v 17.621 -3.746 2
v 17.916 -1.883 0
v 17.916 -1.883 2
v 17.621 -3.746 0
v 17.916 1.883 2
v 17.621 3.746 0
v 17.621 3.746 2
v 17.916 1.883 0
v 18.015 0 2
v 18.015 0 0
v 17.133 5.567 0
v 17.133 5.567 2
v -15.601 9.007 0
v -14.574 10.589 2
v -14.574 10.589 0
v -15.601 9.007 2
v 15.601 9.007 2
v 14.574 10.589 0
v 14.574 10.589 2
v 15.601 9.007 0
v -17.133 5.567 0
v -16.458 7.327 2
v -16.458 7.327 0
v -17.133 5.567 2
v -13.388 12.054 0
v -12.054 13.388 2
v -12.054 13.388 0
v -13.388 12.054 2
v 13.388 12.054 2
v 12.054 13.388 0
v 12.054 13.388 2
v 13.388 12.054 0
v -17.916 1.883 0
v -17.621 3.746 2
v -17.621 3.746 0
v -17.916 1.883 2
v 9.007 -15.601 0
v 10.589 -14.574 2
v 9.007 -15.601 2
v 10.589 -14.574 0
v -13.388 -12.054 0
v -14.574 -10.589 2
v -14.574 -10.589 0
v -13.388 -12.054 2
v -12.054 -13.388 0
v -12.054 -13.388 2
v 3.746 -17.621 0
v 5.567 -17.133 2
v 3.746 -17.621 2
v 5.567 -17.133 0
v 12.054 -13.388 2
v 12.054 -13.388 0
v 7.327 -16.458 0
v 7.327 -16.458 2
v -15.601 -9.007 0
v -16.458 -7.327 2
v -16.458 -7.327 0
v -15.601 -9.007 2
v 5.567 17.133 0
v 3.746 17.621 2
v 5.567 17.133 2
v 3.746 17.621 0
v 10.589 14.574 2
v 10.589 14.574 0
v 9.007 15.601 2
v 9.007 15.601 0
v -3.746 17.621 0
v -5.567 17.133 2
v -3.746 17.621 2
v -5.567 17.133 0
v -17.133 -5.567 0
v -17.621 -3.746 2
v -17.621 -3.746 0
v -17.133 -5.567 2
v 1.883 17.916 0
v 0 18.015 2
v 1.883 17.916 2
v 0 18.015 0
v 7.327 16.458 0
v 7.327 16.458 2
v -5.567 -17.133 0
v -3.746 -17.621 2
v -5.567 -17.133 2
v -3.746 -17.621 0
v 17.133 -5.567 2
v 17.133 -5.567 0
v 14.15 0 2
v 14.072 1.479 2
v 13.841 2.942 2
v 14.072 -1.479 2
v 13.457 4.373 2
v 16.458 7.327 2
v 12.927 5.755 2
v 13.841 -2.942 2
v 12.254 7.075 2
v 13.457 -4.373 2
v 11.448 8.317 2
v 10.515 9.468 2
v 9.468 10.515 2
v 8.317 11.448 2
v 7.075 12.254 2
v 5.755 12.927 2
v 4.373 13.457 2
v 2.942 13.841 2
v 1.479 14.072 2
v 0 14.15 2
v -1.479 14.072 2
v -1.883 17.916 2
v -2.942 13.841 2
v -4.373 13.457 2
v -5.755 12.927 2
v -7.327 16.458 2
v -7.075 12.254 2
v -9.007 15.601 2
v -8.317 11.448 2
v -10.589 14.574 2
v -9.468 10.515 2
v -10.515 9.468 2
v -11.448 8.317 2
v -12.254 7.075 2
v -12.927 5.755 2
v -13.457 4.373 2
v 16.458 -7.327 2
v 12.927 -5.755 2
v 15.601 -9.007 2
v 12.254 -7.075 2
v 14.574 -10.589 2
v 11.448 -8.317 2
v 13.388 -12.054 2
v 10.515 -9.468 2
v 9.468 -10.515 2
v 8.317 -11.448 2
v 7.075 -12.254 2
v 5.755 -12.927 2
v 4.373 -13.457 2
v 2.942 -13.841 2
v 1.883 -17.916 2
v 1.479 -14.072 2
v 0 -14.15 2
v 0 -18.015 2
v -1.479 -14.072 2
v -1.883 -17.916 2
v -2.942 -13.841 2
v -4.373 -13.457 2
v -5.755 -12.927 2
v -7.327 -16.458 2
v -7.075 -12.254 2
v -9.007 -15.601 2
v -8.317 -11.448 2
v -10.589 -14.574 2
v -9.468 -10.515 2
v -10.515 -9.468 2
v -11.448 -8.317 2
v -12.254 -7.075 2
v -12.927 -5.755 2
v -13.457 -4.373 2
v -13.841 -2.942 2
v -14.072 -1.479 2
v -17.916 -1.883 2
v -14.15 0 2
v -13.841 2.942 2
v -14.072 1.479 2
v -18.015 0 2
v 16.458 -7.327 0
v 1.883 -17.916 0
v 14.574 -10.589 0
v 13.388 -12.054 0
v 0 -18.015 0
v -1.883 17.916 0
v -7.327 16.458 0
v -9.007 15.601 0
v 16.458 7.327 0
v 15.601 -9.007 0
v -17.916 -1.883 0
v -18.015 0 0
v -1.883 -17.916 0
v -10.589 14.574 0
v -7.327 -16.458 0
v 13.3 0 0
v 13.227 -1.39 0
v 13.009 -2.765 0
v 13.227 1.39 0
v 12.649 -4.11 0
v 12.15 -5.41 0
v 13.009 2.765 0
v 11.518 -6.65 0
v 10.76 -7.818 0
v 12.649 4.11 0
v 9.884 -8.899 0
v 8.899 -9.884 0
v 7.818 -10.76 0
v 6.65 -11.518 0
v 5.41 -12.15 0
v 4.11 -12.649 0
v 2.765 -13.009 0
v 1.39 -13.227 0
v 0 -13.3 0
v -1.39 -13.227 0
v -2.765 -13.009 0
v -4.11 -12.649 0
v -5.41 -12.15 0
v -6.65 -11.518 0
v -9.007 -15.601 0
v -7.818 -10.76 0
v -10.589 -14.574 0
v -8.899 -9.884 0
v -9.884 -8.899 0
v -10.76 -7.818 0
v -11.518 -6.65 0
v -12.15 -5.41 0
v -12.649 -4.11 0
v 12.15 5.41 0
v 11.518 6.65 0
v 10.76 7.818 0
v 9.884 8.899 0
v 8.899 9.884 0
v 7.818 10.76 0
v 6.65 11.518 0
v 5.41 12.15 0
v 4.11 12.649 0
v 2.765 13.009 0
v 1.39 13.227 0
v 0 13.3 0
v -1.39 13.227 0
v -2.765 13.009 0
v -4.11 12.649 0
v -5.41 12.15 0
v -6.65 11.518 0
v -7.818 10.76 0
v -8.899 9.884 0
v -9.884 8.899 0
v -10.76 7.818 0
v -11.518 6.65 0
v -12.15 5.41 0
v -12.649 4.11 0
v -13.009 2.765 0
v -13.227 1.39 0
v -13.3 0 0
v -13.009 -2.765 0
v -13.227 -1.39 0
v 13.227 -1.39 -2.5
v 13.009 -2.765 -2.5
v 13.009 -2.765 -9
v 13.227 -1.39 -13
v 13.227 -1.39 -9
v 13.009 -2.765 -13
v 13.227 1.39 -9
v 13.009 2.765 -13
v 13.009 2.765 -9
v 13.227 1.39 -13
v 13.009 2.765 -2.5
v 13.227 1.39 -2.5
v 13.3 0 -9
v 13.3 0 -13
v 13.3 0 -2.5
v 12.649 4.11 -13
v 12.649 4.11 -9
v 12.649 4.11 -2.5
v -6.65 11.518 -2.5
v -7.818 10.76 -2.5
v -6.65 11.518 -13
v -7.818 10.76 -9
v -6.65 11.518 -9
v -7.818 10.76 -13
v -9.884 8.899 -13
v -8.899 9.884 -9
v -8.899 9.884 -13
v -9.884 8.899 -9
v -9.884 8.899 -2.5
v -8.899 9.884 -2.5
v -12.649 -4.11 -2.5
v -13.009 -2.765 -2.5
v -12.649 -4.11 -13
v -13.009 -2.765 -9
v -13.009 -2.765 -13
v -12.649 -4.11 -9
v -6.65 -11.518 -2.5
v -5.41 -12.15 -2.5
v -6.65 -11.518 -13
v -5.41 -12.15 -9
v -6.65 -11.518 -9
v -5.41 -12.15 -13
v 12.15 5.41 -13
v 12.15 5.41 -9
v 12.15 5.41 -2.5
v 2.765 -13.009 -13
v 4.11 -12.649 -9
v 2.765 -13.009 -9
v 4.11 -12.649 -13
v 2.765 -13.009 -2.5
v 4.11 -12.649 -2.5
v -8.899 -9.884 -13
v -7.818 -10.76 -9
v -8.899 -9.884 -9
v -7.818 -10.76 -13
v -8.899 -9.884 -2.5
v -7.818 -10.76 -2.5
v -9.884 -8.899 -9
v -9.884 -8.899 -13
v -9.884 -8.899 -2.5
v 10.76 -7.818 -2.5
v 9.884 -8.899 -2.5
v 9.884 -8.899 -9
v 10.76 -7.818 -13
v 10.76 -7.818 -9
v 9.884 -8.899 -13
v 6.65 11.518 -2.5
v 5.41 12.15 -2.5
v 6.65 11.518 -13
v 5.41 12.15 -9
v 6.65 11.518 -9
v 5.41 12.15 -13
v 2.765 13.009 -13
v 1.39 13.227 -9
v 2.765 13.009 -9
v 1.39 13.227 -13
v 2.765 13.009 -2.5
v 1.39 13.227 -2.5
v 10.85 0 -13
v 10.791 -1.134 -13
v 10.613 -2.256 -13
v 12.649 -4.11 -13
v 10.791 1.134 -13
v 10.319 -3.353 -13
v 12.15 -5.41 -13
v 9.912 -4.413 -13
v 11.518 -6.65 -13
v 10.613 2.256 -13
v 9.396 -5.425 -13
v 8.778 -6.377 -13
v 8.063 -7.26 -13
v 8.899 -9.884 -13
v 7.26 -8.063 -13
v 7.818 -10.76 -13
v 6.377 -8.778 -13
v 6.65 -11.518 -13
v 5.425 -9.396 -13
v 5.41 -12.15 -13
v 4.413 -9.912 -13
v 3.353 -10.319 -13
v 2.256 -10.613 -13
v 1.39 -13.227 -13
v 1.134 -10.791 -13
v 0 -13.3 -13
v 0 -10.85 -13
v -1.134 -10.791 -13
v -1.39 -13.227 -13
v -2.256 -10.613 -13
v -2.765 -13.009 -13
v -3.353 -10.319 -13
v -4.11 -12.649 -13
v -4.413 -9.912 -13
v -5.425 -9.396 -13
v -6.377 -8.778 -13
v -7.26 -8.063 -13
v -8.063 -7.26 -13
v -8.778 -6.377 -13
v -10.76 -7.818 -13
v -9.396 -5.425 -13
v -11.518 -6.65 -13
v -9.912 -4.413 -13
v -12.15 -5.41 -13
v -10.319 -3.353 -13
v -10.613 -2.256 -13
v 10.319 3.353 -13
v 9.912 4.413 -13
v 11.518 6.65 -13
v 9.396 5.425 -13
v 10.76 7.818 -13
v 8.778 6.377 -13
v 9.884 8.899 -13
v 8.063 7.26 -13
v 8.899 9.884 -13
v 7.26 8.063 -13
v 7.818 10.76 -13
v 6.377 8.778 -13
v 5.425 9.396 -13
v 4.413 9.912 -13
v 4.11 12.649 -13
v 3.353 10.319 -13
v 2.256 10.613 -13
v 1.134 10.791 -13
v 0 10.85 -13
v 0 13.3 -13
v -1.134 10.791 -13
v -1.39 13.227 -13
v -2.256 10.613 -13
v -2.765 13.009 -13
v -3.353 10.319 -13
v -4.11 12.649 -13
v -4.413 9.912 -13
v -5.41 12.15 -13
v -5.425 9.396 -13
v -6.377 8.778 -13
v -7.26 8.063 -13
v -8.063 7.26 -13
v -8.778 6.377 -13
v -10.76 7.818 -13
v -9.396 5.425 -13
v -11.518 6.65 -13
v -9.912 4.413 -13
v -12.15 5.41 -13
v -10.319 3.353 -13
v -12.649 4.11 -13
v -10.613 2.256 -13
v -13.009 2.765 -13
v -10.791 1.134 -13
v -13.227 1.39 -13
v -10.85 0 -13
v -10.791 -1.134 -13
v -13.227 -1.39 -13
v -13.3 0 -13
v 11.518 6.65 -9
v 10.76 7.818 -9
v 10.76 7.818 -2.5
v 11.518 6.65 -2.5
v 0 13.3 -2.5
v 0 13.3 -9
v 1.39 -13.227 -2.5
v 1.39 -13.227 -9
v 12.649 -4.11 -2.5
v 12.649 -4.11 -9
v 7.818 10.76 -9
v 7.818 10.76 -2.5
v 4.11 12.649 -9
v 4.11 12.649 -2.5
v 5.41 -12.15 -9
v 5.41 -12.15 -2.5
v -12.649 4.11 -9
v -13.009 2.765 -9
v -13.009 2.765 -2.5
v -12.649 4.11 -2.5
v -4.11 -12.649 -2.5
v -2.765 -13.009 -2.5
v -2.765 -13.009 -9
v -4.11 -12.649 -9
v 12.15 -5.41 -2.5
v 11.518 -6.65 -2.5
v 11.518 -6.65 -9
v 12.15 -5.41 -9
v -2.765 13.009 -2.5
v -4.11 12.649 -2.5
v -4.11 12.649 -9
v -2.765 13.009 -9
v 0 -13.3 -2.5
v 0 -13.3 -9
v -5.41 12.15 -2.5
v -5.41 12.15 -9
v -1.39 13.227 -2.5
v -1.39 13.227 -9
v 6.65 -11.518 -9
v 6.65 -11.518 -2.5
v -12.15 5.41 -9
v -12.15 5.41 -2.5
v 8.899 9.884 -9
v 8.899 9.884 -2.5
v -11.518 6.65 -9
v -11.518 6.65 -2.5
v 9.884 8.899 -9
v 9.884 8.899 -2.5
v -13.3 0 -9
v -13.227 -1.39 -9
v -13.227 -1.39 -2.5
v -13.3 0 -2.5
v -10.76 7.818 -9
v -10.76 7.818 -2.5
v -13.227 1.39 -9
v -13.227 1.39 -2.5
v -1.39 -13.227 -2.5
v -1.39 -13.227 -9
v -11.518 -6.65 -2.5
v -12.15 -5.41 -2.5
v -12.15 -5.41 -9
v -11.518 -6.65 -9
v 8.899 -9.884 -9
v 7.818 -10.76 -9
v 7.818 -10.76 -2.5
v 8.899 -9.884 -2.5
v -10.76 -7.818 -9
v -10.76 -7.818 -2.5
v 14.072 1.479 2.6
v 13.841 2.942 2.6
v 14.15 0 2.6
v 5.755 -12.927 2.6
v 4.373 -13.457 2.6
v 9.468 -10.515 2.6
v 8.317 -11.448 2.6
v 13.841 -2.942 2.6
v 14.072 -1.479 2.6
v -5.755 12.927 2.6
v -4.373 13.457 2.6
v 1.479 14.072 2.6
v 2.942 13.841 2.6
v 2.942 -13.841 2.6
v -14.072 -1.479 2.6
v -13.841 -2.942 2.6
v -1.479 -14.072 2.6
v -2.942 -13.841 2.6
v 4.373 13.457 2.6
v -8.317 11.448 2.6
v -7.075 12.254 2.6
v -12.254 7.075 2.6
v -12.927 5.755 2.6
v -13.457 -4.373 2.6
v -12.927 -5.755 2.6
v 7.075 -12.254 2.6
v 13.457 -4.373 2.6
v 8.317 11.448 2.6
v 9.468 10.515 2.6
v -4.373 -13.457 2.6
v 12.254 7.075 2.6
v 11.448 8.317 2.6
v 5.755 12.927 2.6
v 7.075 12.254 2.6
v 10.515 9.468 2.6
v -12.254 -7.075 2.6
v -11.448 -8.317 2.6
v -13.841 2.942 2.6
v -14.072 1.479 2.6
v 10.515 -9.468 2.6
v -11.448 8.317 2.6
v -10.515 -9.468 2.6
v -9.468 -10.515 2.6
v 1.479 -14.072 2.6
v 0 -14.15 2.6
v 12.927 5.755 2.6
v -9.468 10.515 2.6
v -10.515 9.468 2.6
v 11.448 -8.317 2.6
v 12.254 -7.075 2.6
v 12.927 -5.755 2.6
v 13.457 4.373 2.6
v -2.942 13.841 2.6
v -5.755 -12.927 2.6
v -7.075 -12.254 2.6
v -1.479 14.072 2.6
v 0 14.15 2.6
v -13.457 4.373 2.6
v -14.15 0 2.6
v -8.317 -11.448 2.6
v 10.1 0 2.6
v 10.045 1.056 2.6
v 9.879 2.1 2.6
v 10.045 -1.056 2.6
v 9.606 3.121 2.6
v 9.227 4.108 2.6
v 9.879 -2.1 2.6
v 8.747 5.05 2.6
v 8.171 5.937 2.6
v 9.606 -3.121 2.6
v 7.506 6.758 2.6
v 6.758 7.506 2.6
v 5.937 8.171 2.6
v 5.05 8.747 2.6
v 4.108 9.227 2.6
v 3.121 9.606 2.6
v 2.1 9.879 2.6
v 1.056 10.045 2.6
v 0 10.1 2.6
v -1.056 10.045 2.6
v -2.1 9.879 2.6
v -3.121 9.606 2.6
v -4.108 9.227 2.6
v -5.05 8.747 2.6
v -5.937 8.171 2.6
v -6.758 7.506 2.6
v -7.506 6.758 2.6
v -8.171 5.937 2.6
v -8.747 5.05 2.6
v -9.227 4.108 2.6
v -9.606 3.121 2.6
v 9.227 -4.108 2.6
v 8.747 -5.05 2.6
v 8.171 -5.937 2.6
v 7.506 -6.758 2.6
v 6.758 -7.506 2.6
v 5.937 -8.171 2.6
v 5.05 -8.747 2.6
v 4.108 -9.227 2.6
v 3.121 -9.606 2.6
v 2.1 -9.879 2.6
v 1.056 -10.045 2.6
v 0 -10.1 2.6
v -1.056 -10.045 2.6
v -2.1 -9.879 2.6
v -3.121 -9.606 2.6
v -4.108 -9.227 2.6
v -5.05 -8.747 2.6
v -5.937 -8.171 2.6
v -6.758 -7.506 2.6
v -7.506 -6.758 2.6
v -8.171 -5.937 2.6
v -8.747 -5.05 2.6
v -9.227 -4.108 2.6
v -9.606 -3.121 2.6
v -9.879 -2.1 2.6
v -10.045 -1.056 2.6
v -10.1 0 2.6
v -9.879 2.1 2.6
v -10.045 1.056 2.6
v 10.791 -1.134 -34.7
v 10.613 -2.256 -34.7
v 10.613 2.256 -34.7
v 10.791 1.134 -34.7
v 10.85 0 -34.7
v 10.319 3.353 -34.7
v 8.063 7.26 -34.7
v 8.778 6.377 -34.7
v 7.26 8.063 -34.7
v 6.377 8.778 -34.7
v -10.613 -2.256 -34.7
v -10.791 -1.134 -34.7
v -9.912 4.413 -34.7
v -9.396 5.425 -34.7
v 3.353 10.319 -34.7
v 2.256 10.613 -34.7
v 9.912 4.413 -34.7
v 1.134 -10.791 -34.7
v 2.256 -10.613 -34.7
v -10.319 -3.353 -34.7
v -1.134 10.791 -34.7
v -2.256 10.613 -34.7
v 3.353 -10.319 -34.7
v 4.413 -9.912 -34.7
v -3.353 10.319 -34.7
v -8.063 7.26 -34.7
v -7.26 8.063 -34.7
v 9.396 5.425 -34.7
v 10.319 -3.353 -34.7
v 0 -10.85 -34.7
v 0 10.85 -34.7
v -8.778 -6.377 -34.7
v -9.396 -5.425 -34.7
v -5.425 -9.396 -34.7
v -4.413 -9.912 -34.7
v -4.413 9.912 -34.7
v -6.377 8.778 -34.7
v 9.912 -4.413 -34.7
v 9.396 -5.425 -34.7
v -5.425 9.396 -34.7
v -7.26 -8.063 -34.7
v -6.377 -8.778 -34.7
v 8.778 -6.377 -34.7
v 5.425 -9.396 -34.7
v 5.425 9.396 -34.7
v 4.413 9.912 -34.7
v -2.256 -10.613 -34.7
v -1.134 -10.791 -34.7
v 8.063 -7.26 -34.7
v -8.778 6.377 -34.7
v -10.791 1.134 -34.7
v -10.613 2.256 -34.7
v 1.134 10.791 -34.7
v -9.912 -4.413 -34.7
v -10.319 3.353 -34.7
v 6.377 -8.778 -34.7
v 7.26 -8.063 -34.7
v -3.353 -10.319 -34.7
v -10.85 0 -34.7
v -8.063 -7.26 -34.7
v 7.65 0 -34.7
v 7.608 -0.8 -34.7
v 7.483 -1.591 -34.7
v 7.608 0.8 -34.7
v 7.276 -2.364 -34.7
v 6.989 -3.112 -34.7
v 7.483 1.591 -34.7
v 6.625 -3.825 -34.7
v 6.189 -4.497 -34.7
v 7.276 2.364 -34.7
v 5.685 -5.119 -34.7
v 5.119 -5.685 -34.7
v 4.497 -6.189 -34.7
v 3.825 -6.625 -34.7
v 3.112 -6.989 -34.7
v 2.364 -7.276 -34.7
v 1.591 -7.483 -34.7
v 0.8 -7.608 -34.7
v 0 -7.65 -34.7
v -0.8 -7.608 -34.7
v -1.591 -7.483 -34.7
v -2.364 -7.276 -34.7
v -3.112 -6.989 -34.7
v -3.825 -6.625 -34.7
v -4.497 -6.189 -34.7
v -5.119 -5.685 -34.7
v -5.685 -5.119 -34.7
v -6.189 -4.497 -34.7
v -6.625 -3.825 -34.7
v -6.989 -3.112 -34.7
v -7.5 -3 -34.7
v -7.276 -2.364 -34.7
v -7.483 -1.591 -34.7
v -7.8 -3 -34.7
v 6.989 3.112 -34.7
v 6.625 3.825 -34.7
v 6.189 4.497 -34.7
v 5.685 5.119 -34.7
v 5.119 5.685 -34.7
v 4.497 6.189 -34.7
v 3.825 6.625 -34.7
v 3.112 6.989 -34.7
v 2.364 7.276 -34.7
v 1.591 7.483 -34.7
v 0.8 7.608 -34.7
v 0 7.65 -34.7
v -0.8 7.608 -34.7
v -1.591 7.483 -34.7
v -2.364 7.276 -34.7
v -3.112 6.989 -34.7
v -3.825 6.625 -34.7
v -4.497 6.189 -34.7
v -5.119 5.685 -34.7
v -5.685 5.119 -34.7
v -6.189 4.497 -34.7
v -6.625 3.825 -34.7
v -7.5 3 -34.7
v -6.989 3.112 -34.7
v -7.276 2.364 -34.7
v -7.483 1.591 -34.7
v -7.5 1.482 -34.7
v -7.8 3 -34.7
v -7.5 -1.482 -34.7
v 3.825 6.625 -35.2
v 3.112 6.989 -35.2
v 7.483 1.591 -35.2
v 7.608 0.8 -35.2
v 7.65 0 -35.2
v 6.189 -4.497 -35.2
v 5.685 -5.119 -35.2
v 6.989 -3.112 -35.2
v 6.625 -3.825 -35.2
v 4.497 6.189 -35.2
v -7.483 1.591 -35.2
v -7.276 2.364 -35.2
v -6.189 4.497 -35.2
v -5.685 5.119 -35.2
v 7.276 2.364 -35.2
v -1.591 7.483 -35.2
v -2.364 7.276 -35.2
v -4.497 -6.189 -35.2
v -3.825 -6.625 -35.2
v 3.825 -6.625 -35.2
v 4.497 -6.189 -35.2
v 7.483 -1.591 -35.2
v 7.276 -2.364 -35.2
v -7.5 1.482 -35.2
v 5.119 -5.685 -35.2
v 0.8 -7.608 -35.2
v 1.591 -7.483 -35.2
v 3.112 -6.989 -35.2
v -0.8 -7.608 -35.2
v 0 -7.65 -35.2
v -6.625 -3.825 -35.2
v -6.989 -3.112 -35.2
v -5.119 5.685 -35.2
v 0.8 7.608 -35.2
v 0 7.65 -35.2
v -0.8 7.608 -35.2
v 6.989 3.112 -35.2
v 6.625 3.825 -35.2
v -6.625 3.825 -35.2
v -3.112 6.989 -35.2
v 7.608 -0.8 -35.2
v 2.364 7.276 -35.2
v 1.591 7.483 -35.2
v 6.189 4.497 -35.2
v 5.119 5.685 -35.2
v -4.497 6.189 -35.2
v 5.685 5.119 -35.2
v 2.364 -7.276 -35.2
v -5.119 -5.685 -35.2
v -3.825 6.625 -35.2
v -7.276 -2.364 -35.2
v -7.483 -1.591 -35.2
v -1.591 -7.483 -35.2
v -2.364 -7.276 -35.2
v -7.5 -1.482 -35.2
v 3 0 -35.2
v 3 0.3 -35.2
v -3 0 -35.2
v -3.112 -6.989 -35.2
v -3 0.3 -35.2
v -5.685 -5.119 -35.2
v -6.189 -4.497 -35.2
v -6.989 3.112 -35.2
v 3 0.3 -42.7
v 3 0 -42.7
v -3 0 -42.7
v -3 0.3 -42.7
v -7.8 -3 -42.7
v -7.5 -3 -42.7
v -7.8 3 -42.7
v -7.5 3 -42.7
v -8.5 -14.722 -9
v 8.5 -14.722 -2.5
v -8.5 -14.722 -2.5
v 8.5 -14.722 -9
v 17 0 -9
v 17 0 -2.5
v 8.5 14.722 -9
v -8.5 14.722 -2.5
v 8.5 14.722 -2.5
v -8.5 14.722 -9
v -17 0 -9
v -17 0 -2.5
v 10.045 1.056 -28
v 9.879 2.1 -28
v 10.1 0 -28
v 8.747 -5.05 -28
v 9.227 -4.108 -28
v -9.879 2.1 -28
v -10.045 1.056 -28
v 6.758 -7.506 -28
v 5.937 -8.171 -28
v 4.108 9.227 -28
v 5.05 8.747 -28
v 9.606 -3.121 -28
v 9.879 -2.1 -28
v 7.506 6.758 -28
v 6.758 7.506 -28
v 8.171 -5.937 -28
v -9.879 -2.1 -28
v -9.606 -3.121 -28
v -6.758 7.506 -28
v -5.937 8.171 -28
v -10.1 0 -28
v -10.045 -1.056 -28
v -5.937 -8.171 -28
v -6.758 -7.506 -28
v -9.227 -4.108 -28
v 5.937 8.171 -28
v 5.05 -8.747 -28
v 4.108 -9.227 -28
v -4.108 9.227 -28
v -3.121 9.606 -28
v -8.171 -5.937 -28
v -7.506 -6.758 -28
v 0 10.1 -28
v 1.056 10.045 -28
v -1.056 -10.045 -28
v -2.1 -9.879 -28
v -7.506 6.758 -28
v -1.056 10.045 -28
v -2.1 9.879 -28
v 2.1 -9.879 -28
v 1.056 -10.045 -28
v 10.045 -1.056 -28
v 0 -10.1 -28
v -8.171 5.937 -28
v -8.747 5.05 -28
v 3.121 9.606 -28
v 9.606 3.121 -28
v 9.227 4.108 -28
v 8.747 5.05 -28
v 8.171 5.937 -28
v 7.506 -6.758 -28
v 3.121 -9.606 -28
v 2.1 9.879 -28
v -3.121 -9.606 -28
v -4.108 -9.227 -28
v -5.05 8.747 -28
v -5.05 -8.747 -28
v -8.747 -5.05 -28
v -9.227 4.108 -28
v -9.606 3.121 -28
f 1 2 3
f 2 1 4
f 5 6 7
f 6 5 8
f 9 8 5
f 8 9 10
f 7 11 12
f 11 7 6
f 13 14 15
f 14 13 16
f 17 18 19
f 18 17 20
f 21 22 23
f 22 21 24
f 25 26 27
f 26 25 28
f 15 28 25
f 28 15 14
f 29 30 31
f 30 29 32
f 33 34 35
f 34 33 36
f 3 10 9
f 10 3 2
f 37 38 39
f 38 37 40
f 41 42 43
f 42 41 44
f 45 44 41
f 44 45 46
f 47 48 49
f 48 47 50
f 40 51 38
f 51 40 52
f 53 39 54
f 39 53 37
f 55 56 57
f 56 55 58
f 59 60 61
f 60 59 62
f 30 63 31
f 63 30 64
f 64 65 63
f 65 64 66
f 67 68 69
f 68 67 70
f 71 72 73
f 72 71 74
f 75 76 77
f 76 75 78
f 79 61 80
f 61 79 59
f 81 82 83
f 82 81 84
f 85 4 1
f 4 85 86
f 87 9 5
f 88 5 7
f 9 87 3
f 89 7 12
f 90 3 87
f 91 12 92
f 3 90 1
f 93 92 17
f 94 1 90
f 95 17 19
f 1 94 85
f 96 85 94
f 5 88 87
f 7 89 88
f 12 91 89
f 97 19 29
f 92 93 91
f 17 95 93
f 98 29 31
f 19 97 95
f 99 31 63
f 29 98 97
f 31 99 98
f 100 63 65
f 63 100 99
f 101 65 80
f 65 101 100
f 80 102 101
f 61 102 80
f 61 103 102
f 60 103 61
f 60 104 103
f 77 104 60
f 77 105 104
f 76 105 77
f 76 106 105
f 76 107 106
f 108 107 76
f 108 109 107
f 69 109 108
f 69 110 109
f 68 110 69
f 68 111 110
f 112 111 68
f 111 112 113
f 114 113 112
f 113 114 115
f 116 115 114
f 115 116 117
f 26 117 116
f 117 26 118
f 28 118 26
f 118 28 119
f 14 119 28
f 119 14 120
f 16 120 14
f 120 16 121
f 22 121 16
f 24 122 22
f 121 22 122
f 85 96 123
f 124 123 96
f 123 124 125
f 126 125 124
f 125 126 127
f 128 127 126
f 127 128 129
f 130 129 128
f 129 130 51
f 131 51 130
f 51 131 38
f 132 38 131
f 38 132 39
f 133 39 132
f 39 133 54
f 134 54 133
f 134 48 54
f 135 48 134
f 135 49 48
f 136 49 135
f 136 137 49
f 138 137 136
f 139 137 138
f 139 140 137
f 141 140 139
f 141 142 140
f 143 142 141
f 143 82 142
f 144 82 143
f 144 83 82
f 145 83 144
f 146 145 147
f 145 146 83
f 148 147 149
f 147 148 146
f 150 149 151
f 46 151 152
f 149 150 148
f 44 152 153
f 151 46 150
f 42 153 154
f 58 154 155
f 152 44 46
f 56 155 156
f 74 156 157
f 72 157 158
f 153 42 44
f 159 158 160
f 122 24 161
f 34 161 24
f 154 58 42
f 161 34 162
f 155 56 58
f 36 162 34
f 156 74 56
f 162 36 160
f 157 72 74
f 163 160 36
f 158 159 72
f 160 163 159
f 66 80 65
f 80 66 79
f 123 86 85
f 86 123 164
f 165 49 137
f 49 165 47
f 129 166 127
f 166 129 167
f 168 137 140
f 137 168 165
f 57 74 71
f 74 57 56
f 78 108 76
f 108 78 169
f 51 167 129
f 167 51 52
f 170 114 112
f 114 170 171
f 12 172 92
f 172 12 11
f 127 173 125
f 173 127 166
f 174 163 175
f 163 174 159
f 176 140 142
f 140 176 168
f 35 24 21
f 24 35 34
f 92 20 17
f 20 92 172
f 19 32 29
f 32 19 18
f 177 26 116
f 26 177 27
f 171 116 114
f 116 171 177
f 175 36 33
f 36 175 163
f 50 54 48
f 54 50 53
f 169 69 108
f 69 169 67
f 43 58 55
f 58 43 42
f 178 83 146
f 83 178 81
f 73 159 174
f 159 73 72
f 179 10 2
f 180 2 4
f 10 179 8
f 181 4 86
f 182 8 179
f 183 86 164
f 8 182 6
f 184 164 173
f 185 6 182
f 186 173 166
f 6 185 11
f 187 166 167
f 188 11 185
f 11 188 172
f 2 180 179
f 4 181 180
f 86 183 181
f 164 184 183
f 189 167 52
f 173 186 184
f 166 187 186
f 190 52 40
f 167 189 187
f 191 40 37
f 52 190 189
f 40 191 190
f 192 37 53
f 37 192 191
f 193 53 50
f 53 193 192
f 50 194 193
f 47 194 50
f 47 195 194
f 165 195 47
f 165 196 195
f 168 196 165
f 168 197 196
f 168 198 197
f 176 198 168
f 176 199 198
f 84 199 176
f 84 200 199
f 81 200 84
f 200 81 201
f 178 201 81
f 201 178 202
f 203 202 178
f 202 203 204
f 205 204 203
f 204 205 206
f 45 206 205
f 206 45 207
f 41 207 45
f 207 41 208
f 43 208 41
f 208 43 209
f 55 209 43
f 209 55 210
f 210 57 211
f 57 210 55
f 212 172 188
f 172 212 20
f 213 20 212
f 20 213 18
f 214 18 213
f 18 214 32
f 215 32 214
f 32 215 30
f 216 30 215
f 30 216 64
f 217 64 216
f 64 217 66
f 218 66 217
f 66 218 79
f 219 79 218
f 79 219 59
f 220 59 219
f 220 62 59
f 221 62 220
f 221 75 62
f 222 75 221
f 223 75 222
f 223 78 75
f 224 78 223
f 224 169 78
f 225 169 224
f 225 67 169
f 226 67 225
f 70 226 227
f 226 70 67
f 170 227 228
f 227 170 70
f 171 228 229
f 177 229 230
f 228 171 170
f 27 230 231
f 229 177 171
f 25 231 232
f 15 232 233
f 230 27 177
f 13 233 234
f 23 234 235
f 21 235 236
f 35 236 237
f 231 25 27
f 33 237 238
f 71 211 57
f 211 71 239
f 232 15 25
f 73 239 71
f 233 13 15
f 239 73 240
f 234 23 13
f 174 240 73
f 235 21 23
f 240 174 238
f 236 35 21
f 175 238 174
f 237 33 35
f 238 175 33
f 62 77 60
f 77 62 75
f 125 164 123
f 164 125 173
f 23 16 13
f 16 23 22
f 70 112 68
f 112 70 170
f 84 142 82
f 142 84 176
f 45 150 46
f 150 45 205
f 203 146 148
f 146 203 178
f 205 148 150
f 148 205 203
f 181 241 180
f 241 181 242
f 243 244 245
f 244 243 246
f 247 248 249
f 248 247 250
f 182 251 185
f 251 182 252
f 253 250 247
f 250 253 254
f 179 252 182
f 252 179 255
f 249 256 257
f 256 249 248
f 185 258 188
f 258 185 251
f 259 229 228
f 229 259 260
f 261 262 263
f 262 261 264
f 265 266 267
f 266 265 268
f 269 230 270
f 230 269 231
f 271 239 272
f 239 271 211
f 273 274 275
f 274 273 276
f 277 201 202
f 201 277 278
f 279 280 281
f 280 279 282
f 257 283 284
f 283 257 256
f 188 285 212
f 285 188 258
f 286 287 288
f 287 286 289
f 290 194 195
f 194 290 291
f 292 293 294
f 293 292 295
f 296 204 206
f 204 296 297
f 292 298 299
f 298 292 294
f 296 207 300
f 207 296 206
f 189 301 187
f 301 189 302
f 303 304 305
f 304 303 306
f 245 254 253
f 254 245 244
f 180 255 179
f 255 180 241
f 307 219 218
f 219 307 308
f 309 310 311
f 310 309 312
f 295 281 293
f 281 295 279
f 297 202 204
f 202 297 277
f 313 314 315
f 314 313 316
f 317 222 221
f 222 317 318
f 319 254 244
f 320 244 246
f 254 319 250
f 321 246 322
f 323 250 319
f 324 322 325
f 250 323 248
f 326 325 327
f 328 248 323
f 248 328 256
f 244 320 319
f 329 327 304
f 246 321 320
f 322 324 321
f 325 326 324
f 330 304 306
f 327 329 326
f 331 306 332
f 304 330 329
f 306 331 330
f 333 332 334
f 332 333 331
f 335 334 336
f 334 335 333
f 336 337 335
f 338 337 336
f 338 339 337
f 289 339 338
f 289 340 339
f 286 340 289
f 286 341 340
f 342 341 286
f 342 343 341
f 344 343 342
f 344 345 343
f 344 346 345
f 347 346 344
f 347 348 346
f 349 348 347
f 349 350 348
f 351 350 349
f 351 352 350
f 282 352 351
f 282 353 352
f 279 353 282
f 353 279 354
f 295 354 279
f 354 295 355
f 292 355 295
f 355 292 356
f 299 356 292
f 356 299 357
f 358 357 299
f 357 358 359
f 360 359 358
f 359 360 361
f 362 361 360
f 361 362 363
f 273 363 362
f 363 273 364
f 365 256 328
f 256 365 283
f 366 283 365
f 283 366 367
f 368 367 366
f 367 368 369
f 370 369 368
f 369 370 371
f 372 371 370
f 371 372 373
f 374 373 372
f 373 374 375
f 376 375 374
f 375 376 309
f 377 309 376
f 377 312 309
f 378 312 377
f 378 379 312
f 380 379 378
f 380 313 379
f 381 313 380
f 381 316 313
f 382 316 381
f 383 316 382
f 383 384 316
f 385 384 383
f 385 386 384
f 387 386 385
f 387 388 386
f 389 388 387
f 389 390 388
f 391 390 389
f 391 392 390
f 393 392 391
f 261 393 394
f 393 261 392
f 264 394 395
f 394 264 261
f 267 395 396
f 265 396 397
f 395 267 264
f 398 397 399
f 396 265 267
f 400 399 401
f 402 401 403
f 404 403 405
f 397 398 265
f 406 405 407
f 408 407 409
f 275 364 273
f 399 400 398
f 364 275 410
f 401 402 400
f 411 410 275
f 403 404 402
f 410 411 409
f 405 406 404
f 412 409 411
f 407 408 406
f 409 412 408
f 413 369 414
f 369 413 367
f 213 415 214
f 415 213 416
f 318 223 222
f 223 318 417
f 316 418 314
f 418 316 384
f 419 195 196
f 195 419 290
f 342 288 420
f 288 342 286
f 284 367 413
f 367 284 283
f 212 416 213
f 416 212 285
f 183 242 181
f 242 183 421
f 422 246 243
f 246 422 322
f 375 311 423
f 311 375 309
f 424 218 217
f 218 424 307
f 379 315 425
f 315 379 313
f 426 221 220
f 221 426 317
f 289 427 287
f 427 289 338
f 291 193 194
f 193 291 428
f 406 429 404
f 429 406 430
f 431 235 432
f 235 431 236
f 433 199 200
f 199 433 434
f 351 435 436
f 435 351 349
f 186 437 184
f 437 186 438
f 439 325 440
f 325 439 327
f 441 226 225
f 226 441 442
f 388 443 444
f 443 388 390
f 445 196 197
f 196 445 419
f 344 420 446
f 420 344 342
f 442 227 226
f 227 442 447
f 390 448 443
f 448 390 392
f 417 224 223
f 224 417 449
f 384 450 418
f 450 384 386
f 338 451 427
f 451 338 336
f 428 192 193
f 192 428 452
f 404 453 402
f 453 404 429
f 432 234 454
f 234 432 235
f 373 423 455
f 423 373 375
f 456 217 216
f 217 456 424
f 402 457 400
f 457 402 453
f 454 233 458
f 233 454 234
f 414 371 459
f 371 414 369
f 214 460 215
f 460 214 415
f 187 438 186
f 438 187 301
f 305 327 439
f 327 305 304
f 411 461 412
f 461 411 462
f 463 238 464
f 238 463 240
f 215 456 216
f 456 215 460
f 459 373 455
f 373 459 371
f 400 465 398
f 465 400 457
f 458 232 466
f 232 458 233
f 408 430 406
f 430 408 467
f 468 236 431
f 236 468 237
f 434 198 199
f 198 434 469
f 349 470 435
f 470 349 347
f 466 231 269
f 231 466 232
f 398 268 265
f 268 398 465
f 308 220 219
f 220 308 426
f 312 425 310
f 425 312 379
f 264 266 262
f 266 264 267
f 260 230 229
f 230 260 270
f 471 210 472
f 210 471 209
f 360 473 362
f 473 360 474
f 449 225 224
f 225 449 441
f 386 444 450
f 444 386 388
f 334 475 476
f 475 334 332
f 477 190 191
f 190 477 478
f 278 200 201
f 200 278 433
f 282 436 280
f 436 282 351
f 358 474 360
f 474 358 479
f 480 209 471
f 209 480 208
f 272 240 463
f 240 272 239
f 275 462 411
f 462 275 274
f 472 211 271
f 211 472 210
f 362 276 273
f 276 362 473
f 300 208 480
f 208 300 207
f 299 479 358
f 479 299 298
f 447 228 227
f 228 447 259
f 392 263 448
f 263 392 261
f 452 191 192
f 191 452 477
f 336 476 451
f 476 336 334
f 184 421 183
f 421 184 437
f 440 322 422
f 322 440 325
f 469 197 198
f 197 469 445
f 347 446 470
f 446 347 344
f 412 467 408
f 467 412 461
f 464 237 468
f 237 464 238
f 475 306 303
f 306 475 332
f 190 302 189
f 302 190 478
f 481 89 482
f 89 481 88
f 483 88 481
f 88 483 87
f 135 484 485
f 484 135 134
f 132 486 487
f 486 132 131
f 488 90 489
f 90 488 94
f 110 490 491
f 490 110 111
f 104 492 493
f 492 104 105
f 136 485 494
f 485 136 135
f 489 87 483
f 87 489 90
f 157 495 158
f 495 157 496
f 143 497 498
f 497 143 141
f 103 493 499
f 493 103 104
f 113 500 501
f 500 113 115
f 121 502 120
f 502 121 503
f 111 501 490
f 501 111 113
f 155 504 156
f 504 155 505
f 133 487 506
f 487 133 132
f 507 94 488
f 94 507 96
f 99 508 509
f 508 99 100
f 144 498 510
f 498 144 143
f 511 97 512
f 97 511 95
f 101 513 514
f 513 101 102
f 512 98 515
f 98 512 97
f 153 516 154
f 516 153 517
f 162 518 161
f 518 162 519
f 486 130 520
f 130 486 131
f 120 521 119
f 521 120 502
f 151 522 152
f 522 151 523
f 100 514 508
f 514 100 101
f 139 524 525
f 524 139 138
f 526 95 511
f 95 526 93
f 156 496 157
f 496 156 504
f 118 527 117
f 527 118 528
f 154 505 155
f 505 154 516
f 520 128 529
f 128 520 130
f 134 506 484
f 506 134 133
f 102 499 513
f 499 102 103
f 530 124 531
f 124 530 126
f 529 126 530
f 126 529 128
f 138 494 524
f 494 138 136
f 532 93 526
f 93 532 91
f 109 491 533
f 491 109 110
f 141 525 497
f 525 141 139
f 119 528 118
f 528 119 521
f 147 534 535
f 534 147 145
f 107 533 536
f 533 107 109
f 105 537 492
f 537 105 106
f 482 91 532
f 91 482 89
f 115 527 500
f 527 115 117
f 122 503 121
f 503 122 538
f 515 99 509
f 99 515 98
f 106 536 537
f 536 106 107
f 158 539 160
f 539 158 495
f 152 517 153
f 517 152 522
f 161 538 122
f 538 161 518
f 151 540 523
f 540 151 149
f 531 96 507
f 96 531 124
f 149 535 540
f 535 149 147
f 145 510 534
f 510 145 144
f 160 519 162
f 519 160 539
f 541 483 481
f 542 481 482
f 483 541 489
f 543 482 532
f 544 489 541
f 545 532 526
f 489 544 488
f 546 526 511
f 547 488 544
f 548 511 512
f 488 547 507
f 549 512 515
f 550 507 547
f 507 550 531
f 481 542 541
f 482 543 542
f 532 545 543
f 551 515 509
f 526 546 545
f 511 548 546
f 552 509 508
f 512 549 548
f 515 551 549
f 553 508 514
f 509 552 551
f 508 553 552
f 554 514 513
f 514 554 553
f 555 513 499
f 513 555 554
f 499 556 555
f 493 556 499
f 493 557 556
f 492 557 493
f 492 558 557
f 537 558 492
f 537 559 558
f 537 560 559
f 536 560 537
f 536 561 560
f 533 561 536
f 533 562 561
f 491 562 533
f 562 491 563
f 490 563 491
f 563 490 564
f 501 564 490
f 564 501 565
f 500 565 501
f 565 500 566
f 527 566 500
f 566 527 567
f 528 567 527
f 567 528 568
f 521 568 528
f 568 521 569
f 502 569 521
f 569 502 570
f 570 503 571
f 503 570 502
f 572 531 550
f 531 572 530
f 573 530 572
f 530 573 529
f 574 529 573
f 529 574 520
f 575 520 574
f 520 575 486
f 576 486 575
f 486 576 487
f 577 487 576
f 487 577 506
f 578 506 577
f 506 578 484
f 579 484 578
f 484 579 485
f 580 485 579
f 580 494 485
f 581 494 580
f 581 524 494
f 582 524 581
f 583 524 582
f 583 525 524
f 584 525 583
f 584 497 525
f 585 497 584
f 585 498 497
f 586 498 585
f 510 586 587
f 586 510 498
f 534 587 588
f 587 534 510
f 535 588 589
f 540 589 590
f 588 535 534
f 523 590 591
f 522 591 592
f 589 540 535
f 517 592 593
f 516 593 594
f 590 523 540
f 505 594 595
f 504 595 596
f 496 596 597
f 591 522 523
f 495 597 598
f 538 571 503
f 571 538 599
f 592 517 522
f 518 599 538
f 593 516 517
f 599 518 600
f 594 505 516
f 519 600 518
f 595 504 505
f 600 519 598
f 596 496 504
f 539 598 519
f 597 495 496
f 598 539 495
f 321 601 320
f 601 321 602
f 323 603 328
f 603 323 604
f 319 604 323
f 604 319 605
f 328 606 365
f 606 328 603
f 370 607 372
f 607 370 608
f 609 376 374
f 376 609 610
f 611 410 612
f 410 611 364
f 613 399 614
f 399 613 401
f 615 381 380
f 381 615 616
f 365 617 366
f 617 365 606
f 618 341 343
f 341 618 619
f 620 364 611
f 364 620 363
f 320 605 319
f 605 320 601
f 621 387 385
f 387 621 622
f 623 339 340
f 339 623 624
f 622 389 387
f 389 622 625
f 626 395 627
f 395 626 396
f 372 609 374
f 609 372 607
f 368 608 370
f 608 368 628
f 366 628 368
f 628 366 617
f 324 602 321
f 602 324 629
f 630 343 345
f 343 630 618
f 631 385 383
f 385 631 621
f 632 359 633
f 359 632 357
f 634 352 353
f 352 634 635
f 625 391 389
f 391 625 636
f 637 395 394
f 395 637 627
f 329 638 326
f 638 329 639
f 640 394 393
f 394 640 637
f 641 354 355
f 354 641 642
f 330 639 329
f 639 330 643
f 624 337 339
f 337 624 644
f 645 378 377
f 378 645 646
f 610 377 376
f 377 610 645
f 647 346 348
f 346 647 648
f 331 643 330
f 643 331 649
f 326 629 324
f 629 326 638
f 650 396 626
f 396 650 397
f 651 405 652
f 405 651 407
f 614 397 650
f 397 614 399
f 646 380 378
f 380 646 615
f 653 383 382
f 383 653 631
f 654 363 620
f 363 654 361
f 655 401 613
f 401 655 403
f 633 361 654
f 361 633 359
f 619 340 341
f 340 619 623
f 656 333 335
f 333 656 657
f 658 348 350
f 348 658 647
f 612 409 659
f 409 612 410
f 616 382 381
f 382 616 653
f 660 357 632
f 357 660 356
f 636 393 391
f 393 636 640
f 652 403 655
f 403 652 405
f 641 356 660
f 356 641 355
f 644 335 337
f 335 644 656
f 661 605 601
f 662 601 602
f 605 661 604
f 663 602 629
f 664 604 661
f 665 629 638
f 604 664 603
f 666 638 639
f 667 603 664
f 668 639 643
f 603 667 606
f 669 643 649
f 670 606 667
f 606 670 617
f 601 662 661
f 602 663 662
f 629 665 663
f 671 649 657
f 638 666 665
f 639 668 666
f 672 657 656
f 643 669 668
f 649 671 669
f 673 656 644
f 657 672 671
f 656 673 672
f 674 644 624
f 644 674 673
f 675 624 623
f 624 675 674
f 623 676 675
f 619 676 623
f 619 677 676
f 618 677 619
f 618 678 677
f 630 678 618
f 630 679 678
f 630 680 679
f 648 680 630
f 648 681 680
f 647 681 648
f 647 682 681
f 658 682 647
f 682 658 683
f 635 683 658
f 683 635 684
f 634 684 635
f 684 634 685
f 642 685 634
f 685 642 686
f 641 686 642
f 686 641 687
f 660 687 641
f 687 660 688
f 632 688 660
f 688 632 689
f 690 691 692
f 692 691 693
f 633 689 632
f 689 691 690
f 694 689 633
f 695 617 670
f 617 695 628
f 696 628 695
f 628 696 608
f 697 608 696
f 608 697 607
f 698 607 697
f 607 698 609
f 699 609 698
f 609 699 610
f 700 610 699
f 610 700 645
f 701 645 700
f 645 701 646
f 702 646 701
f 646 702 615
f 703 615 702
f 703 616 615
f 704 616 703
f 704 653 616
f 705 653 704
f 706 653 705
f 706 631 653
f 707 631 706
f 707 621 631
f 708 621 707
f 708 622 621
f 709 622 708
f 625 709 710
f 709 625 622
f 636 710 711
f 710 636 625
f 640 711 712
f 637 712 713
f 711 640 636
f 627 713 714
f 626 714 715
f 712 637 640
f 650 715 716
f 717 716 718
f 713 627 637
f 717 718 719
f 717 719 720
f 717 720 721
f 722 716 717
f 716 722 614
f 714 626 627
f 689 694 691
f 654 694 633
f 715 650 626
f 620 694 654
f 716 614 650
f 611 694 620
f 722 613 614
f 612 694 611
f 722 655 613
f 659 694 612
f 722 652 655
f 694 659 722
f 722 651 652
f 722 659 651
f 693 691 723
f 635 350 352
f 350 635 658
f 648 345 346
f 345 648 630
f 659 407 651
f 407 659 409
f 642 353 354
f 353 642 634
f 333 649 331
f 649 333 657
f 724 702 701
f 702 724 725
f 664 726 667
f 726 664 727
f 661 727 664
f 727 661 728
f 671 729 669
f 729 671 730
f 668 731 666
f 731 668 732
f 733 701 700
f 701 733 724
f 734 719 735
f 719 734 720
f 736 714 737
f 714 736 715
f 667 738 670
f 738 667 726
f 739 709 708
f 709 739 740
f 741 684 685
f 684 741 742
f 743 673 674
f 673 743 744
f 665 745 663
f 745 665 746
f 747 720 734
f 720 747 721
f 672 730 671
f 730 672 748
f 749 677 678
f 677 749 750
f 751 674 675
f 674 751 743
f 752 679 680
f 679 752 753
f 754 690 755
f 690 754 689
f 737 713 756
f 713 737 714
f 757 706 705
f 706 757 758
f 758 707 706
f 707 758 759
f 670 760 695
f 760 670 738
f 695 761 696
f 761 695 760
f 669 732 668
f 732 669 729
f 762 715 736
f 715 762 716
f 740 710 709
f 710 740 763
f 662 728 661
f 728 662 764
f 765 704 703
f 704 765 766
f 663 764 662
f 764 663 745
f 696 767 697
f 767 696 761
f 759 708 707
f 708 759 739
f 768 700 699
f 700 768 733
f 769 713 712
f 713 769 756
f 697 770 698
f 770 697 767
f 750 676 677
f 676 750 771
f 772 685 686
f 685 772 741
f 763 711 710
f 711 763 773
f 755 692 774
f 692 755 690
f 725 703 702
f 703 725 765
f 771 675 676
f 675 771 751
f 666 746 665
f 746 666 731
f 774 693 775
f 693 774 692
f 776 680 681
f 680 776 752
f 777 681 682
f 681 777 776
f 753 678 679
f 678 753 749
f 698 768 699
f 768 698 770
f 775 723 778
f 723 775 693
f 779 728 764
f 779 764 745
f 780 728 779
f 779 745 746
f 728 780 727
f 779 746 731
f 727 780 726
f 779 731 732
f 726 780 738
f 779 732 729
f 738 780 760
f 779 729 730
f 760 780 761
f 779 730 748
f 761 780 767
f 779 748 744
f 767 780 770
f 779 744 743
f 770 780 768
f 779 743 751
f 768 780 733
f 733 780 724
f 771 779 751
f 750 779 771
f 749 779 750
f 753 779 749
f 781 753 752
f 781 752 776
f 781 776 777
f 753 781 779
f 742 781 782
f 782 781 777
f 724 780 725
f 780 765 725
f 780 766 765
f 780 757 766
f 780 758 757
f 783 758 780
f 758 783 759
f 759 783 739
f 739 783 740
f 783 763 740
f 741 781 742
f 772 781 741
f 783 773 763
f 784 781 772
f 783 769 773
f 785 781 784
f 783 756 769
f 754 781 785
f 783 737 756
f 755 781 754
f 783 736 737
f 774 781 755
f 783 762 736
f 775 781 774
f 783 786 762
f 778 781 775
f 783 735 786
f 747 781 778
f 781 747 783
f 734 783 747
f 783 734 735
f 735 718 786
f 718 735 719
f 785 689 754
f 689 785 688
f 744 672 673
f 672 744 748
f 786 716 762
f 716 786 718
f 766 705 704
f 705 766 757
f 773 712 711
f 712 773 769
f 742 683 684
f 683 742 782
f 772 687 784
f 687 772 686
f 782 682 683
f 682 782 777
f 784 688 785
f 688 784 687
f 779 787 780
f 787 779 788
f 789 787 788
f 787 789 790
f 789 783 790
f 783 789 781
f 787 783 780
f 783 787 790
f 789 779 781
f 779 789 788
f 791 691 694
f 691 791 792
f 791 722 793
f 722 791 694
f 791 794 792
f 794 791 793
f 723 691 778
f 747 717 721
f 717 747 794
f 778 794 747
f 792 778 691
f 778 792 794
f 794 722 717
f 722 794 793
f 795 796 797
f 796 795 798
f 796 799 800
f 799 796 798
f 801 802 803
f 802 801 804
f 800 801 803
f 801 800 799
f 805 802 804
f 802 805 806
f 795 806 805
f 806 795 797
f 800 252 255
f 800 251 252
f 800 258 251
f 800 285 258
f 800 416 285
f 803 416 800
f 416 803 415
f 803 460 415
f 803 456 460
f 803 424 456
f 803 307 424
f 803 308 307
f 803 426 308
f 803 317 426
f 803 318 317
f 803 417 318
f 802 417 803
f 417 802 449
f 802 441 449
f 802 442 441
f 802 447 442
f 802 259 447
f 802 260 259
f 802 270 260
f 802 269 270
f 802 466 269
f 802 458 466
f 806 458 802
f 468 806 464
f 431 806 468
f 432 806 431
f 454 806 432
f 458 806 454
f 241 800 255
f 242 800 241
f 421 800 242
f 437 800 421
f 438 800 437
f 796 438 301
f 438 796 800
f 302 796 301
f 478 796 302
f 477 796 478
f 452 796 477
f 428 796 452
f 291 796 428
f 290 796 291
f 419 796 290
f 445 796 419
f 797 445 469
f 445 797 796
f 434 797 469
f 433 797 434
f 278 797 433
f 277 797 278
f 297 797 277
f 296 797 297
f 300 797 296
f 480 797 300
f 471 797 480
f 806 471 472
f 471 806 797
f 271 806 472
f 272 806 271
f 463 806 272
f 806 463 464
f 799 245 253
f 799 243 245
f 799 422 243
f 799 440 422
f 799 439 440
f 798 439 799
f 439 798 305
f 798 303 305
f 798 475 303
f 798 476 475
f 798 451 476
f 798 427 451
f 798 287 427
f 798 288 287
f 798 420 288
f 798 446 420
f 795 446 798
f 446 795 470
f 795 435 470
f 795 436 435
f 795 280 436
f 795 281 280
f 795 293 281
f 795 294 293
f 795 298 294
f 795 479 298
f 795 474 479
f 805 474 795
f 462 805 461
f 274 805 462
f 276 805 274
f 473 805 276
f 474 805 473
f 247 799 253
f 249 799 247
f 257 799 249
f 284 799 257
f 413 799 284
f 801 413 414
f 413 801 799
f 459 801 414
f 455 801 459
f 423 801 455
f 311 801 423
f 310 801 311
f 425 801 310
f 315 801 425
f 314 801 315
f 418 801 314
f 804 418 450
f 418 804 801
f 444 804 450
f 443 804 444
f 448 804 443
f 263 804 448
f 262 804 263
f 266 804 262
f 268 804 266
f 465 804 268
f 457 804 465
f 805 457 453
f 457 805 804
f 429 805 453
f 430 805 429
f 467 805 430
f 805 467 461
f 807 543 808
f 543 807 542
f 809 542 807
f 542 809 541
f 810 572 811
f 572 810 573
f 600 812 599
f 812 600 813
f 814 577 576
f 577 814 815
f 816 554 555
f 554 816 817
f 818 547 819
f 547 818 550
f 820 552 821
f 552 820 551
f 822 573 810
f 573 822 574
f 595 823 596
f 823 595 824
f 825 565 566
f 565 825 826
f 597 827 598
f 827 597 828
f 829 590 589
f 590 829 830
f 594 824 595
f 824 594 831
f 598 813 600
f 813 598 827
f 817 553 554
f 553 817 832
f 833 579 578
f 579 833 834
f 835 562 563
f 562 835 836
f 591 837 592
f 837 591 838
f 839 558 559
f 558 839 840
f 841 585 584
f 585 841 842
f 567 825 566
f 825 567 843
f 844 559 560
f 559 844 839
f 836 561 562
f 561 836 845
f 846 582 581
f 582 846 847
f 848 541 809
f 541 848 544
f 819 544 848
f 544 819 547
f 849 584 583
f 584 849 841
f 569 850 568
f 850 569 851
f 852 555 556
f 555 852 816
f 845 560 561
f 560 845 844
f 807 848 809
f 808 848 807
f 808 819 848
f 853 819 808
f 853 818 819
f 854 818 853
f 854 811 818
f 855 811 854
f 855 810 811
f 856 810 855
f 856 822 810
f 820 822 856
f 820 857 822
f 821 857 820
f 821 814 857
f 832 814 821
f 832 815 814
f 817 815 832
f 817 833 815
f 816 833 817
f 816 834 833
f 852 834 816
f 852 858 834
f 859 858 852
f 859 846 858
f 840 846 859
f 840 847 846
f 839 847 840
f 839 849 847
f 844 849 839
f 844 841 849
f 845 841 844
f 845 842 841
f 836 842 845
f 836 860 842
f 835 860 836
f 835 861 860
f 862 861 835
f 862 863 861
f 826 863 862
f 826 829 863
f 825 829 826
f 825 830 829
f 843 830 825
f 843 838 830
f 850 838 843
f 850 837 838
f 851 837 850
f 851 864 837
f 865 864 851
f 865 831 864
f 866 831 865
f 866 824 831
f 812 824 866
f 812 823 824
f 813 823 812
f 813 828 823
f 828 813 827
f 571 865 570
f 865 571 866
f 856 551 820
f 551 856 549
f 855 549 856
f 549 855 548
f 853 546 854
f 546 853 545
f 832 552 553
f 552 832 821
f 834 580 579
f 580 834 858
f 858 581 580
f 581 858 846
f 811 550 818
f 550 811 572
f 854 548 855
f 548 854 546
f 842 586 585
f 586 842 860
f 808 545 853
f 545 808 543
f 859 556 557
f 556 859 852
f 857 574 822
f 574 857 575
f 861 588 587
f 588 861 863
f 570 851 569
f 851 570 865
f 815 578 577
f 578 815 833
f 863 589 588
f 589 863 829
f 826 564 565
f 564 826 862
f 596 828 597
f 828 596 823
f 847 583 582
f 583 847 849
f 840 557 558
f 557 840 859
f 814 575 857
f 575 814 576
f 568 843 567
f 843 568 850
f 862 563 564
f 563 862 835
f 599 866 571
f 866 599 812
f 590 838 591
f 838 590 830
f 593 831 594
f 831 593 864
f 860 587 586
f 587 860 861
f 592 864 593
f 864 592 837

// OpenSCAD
$fn=60;
difference() {
    union() {
    color("orange") cylinder(d=36.03,h=2);
    color("orange") translate([0,0,-13]) cylinder(h=13, d=26.6);
    color("lightgray") translate([0,0,0.1]) cylinder(d=28.3, h=2.5);
    color("lightgray") translate([0,0,-21.7-13]) cylinder(d=21.7, h=21.7);
    color("#404040") translate([0,0,-21.7-13-0.5]) cylinder(d=15.3, h=1);
    color("lightgray") translate([-3,0,-21.7-13-8]) cube([6, 0.3, 8]);
    color("lightgray") rotate([0,0,90]) translate([-3,7.5,-21.7-13-8]) cube([6, 0.3, 8]);
    color("#404040") translate([0,0,-9]) cylinder(d=34, h=6.5, $fn=6);
    }
    translate([0,0,-28]) cylinder(d=20.2, h=31.2);
}
